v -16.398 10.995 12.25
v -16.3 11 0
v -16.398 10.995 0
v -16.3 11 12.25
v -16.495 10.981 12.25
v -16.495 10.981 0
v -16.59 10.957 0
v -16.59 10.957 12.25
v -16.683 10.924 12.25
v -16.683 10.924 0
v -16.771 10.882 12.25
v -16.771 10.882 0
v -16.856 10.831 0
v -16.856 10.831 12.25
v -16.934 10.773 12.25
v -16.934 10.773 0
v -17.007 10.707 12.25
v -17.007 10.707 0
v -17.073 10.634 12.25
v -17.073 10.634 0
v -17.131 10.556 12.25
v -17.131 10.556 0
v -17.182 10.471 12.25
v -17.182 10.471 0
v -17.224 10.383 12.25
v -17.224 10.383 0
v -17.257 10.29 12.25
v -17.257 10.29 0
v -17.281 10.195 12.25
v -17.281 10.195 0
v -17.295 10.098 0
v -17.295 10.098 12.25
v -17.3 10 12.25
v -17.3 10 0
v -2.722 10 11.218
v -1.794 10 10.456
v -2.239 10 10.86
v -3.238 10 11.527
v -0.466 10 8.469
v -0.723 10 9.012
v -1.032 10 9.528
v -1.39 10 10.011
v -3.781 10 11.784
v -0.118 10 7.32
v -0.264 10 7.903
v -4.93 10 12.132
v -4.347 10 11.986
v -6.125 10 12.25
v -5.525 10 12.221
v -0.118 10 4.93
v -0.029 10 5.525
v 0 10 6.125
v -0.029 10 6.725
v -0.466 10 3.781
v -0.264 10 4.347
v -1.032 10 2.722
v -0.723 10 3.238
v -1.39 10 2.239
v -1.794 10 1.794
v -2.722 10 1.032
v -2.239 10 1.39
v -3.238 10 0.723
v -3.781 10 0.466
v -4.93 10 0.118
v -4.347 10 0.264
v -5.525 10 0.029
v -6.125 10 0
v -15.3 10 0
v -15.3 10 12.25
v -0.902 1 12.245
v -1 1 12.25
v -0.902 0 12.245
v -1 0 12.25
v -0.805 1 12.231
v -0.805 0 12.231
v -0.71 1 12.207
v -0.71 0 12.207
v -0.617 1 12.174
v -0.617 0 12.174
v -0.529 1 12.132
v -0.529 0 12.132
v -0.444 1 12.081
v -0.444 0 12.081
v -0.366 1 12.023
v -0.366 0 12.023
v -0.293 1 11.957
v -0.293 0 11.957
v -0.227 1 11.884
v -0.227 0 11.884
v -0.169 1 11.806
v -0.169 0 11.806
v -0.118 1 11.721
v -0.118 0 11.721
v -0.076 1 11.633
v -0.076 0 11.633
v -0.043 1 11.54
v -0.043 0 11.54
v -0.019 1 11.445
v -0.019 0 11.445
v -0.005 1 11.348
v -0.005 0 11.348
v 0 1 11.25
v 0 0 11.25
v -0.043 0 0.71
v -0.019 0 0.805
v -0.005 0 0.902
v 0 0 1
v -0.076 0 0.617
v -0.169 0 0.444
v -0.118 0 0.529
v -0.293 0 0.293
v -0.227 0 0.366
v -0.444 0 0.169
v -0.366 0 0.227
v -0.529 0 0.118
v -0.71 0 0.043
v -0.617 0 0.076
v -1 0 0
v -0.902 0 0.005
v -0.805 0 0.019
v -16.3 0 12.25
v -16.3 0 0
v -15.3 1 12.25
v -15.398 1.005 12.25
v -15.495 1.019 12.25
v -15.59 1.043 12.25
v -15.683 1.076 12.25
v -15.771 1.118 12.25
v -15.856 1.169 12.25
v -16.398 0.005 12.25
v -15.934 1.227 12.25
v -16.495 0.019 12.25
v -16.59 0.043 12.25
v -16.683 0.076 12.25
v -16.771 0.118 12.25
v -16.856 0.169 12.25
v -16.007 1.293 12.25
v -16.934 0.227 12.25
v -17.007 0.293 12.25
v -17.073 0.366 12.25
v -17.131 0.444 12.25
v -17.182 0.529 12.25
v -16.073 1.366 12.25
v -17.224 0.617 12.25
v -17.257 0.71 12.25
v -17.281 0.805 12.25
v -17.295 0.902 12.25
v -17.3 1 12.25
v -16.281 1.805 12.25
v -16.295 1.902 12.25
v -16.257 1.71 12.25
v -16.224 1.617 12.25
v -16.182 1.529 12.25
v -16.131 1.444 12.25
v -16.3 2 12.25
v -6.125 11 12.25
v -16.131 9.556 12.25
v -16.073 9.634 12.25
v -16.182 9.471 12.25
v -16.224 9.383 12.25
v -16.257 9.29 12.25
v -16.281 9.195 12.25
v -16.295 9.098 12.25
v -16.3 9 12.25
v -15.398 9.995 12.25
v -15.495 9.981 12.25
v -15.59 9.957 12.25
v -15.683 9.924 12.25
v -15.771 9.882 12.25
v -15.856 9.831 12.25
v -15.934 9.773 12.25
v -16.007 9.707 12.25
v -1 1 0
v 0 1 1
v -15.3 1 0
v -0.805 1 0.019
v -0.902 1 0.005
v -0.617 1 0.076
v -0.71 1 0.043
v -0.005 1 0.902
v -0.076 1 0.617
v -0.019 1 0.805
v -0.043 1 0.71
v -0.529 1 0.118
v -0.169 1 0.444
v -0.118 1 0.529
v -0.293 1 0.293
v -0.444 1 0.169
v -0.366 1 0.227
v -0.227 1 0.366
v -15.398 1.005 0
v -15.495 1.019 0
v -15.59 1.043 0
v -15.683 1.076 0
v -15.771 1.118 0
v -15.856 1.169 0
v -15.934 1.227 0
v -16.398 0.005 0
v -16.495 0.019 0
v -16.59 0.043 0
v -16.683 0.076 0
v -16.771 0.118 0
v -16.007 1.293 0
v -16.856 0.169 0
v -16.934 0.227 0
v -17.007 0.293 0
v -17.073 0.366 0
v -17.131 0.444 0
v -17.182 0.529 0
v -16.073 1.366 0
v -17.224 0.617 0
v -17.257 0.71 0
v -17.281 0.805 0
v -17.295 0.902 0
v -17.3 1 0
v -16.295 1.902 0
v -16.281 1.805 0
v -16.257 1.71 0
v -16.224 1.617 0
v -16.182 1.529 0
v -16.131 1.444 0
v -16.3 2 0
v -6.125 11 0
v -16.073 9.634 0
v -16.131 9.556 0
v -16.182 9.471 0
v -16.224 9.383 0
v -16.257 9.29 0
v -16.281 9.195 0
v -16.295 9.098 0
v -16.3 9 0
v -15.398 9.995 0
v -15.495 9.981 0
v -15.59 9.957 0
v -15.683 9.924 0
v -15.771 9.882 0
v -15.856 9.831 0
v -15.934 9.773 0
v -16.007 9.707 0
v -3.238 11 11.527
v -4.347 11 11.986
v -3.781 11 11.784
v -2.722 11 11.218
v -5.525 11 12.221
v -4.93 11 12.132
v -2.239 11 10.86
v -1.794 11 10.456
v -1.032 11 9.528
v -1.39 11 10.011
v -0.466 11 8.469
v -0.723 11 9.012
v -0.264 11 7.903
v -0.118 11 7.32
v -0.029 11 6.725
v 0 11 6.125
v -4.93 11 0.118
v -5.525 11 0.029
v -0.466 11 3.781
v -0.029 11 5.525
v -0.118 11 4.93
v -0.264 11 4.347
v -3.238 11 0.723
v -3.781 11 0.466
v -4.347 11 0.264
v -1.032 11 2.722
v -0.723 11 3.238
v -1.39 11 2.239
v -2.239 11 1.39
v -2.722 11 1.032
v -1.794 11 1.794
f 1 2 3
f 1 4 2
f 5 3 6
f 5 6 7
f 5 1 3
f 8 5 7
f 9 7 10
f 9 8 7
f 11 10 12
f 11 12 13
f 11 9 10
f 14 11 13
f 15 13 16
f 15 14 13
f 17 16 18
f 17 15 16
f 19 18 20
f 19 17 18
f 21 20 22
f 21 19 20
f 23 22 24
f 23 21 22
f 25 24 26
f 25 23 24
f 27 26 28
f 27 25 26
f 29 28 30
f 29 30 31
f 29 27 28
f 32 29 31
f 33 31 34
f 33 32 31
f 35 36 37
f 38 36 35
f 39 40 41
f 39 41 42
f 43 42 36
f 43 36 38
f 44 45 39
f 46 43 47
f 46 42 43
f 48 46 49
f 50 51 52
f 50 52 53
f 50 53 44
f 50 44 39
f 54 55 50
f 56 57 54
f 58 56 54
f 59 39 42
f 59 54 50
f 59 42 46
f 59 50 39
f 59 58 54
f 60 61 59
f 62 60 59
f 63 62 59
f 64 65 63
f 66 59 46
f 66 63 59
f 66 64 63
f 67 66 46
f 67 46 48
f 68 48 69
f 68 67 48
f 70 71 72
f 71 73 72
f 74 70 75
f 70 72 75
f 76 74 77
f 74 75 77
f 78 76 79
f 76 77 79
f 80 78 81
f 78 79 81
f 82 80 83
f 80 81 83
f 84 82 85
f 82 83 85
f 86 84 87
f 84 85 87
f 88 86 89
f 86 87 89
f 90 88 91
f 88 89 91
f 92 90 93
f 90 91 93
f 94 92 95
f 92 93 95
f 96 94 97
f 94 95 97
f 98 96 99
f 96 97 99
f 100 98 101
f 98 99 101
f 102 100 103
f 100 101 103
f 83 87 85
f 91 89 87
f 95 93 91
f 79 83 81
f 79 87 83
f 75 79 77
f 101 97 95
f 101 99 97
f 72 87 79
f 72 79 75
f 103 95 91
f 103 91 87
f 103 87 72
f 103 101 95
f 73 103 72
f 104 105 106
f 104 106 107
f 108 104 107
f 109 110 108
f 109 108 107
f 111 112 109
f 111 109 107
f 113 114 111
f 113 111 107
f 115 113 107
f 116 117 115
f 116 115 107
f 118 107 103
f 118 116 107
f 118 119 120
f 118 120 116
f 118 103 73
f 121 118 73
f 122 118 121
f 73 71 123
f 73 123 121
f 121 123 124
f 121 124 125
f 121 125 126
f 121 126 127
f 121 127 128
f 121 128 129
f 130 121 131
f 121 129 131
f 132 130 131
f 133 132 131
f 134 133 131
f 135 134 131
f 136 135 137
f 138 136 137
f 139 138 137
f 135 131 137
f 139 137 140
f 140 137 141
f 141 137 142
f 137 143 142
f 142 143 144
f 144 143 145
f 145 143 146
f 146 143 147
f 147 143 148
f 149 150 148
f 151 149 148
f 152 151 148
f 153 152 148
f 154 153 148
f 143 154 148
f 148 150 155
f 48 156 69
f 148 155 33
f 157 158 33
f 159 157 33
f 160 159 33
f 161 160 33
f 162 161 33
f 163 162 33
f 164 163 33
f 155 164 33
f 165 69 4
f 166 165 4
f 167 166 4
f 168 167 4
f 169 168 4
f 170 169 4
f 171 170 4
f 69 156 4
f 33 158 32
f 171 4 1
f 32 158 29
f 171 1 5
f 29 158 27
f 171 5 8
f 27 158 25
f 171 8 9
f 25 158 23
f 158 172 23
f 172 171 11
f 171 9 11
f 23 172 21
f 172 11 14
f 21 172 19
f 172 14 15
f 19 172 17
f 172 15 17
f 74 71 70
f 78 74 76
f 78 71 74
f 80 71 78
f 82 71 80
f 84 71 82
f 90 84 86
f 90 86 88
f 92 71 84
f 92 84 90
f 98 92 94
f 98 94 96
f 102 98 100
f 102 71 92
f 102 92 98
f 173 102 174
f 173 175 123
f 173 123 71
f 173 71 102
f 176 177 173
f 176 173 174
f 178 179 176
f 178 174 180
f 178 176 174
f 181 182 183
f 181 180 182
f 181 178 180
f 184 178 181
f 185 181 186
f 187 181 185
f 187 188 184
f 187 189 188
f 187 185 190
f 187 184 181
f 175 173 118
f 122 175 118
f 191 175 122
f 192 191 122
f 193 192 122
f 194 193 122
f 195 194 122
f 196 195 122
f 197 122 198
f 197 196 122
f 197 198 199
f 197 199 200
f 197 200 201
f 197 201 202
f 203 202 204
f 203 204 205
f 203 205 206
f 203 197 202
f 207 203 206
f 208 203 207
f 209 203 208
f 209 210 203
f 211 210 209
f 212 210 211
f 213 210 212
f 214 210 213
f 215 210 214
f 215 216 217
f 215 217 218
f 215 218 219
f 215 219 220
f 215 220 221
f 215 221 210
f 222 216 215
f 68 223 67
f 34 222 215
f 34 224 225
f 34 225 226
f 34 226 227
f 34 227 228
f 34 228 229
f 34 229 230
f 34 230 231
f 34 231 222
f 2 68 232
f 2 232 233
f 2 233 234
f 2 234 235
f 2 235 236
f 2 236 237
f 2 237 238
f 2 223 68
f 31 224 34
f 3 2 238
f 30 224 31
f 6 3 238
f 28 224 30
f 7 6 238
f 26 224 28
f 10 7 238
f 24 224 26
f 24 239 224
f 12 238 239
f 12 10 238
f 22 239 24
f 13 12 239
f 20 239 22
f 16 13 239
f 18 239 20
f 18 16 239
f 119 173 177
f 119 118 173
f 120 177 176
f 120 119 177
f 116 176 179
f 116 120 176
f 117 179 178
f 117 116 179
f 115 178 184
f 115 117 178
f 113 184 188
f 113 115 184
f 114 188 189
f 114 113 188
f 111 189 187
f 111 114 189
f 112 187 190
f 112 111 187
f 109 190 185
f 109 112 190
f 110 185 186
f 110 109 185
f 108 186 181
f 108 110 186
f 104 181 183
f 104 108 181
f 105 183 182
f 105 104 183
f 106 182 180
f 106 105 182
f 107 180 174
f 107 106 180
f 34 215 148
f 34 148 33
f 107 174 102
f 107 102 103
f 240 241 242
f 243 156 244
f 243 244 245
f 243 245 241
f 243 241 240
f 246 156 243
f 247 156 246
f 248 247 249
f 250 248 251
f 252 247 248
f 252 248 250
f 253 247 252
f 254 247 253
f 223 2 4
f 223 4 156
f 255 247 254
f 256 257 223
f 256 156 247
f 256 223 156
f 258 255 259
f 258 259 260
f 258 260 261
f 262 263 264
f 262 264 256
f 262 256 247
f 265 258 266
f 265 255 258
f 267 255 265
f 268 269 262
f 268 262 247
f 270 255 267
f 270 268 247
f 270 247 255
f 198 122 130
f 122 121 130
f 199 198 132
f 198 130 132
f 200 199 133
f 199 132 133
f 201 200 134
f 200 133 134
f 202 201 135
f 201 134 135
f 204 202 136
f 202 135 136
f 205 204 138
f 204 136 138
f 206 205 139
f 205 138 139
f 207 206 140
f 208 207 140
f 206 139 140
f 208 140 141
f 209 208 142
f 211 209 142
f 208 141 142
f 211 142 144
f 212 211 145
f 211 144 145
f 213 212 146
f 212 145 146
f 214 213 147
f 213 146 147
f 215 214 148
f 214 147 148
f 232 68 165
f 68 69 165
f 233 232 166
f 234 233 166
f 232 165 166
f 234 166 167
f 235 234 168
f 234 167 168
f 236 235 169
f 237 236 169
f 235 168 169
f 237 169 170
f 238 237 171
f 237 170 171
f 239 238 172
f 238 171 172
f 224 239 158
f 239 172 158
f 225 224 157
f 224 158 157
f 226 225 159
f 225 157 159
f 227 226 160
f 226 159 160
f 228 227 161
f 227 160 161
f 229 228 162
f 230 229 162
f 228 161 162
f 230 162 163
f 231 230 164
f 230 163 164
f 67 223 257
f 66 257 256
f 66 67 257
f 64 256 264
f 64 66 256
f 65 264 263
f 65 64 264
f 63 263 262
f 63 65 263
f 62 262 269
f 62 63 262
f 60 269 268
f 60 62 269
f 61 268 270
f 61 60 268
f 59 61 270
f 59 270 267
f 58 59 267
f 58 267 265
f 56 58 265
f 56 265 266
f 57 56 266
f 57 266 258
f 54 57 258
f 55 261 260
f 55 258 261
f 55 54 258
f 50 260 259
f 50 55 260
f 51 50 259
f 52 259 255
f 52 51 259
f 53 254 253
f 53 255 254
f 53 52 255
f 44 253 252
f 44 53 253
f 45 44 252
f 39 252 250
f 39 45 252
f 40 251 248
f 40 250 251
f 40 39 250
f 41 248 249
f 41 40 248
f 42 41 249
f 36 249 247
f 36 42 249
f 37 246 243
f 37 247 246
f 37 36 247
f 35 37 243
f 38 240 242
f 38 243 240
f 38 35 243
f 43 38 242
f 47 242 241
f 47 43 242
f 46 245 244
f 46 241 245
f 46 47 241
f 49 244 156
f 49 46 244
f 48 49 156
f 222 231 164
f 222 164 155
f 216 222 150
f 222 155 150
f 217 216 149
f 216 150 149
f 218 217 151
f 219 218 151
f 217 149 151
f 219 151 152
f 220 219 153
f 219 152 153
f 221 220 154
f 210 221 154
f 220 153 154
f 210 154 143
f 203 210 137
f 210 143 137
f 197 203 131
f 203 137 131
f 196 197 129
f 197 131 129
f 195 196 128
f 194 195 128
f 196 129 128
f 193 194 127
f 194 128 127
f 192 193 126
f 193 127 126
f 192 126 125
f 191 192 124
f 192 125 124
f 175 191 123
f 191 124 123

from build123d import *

# Parameters (mm, degrees)
BOSS_EXTRUDE2_DEPTH = 12.25
FILLET1_RADIUS      = 6.125
FILLET1_LENGTH      = 1
FILLET3_R           = 1


with BuildPart() as part:
    # Sketch1 → Boss-Extrude2 (new body)
    with BuildSketch(Plane.XY):
        Polygon((0, 0), (-17.3, 0), (-17.3, 11), (0, 11), (0, 10), (-16.3, 10), (-16.3, 1), (0, 1), align=None)
    extrude(amount=BOSS_EXTRUDE2_DEPTH)

    # Fillet1: full round fillet: the end face becomes a half cylinder, R = half its width
    fillet1_face = Plane((0, 10.5, 6.125), x_dir=(0, -1, 0), z_dir=(1, 0, 0))  # on the end face: x along it, z out of the body
    fillet1_slab = fillet1_face.offset(-FILLET1_RADIUS / 2) * Box(FILLET1_LENGTH, 2 * FILLET1_RADIUS, FILLET1_RADIUS, mode=Mode.PRIVATE)  # the body's end, R deep
    fillet1_round = Plane((-6.125, 10.5, 6.125), x_dir=(1, 0, 0), z_dir=(0, -1, 0)) * Cylinder(FILLET1_RADIUS, FILLET1_LENGTH, mode=Mode.PRIVATE)  # its axis R under the face
    add(fillet1_slab - fillet1_round, mode=Mode.SUBTRACT)

    # Fillet3
    fillet3_edges = [part.edges().sort_by_distance(p)[0] for p in [
        (0, 0.5, 0),
        (-17.3, 0, 6.125),
        (-17.3, 11, 6.125),
        (-16.3, 10, 6.125),
        (-16.3, 1, 6.125),
        (0, 0.5, 12.25),
    ]]
    fillet(fillet3_edges, radius=FILLET3_R)


solid = part.part
